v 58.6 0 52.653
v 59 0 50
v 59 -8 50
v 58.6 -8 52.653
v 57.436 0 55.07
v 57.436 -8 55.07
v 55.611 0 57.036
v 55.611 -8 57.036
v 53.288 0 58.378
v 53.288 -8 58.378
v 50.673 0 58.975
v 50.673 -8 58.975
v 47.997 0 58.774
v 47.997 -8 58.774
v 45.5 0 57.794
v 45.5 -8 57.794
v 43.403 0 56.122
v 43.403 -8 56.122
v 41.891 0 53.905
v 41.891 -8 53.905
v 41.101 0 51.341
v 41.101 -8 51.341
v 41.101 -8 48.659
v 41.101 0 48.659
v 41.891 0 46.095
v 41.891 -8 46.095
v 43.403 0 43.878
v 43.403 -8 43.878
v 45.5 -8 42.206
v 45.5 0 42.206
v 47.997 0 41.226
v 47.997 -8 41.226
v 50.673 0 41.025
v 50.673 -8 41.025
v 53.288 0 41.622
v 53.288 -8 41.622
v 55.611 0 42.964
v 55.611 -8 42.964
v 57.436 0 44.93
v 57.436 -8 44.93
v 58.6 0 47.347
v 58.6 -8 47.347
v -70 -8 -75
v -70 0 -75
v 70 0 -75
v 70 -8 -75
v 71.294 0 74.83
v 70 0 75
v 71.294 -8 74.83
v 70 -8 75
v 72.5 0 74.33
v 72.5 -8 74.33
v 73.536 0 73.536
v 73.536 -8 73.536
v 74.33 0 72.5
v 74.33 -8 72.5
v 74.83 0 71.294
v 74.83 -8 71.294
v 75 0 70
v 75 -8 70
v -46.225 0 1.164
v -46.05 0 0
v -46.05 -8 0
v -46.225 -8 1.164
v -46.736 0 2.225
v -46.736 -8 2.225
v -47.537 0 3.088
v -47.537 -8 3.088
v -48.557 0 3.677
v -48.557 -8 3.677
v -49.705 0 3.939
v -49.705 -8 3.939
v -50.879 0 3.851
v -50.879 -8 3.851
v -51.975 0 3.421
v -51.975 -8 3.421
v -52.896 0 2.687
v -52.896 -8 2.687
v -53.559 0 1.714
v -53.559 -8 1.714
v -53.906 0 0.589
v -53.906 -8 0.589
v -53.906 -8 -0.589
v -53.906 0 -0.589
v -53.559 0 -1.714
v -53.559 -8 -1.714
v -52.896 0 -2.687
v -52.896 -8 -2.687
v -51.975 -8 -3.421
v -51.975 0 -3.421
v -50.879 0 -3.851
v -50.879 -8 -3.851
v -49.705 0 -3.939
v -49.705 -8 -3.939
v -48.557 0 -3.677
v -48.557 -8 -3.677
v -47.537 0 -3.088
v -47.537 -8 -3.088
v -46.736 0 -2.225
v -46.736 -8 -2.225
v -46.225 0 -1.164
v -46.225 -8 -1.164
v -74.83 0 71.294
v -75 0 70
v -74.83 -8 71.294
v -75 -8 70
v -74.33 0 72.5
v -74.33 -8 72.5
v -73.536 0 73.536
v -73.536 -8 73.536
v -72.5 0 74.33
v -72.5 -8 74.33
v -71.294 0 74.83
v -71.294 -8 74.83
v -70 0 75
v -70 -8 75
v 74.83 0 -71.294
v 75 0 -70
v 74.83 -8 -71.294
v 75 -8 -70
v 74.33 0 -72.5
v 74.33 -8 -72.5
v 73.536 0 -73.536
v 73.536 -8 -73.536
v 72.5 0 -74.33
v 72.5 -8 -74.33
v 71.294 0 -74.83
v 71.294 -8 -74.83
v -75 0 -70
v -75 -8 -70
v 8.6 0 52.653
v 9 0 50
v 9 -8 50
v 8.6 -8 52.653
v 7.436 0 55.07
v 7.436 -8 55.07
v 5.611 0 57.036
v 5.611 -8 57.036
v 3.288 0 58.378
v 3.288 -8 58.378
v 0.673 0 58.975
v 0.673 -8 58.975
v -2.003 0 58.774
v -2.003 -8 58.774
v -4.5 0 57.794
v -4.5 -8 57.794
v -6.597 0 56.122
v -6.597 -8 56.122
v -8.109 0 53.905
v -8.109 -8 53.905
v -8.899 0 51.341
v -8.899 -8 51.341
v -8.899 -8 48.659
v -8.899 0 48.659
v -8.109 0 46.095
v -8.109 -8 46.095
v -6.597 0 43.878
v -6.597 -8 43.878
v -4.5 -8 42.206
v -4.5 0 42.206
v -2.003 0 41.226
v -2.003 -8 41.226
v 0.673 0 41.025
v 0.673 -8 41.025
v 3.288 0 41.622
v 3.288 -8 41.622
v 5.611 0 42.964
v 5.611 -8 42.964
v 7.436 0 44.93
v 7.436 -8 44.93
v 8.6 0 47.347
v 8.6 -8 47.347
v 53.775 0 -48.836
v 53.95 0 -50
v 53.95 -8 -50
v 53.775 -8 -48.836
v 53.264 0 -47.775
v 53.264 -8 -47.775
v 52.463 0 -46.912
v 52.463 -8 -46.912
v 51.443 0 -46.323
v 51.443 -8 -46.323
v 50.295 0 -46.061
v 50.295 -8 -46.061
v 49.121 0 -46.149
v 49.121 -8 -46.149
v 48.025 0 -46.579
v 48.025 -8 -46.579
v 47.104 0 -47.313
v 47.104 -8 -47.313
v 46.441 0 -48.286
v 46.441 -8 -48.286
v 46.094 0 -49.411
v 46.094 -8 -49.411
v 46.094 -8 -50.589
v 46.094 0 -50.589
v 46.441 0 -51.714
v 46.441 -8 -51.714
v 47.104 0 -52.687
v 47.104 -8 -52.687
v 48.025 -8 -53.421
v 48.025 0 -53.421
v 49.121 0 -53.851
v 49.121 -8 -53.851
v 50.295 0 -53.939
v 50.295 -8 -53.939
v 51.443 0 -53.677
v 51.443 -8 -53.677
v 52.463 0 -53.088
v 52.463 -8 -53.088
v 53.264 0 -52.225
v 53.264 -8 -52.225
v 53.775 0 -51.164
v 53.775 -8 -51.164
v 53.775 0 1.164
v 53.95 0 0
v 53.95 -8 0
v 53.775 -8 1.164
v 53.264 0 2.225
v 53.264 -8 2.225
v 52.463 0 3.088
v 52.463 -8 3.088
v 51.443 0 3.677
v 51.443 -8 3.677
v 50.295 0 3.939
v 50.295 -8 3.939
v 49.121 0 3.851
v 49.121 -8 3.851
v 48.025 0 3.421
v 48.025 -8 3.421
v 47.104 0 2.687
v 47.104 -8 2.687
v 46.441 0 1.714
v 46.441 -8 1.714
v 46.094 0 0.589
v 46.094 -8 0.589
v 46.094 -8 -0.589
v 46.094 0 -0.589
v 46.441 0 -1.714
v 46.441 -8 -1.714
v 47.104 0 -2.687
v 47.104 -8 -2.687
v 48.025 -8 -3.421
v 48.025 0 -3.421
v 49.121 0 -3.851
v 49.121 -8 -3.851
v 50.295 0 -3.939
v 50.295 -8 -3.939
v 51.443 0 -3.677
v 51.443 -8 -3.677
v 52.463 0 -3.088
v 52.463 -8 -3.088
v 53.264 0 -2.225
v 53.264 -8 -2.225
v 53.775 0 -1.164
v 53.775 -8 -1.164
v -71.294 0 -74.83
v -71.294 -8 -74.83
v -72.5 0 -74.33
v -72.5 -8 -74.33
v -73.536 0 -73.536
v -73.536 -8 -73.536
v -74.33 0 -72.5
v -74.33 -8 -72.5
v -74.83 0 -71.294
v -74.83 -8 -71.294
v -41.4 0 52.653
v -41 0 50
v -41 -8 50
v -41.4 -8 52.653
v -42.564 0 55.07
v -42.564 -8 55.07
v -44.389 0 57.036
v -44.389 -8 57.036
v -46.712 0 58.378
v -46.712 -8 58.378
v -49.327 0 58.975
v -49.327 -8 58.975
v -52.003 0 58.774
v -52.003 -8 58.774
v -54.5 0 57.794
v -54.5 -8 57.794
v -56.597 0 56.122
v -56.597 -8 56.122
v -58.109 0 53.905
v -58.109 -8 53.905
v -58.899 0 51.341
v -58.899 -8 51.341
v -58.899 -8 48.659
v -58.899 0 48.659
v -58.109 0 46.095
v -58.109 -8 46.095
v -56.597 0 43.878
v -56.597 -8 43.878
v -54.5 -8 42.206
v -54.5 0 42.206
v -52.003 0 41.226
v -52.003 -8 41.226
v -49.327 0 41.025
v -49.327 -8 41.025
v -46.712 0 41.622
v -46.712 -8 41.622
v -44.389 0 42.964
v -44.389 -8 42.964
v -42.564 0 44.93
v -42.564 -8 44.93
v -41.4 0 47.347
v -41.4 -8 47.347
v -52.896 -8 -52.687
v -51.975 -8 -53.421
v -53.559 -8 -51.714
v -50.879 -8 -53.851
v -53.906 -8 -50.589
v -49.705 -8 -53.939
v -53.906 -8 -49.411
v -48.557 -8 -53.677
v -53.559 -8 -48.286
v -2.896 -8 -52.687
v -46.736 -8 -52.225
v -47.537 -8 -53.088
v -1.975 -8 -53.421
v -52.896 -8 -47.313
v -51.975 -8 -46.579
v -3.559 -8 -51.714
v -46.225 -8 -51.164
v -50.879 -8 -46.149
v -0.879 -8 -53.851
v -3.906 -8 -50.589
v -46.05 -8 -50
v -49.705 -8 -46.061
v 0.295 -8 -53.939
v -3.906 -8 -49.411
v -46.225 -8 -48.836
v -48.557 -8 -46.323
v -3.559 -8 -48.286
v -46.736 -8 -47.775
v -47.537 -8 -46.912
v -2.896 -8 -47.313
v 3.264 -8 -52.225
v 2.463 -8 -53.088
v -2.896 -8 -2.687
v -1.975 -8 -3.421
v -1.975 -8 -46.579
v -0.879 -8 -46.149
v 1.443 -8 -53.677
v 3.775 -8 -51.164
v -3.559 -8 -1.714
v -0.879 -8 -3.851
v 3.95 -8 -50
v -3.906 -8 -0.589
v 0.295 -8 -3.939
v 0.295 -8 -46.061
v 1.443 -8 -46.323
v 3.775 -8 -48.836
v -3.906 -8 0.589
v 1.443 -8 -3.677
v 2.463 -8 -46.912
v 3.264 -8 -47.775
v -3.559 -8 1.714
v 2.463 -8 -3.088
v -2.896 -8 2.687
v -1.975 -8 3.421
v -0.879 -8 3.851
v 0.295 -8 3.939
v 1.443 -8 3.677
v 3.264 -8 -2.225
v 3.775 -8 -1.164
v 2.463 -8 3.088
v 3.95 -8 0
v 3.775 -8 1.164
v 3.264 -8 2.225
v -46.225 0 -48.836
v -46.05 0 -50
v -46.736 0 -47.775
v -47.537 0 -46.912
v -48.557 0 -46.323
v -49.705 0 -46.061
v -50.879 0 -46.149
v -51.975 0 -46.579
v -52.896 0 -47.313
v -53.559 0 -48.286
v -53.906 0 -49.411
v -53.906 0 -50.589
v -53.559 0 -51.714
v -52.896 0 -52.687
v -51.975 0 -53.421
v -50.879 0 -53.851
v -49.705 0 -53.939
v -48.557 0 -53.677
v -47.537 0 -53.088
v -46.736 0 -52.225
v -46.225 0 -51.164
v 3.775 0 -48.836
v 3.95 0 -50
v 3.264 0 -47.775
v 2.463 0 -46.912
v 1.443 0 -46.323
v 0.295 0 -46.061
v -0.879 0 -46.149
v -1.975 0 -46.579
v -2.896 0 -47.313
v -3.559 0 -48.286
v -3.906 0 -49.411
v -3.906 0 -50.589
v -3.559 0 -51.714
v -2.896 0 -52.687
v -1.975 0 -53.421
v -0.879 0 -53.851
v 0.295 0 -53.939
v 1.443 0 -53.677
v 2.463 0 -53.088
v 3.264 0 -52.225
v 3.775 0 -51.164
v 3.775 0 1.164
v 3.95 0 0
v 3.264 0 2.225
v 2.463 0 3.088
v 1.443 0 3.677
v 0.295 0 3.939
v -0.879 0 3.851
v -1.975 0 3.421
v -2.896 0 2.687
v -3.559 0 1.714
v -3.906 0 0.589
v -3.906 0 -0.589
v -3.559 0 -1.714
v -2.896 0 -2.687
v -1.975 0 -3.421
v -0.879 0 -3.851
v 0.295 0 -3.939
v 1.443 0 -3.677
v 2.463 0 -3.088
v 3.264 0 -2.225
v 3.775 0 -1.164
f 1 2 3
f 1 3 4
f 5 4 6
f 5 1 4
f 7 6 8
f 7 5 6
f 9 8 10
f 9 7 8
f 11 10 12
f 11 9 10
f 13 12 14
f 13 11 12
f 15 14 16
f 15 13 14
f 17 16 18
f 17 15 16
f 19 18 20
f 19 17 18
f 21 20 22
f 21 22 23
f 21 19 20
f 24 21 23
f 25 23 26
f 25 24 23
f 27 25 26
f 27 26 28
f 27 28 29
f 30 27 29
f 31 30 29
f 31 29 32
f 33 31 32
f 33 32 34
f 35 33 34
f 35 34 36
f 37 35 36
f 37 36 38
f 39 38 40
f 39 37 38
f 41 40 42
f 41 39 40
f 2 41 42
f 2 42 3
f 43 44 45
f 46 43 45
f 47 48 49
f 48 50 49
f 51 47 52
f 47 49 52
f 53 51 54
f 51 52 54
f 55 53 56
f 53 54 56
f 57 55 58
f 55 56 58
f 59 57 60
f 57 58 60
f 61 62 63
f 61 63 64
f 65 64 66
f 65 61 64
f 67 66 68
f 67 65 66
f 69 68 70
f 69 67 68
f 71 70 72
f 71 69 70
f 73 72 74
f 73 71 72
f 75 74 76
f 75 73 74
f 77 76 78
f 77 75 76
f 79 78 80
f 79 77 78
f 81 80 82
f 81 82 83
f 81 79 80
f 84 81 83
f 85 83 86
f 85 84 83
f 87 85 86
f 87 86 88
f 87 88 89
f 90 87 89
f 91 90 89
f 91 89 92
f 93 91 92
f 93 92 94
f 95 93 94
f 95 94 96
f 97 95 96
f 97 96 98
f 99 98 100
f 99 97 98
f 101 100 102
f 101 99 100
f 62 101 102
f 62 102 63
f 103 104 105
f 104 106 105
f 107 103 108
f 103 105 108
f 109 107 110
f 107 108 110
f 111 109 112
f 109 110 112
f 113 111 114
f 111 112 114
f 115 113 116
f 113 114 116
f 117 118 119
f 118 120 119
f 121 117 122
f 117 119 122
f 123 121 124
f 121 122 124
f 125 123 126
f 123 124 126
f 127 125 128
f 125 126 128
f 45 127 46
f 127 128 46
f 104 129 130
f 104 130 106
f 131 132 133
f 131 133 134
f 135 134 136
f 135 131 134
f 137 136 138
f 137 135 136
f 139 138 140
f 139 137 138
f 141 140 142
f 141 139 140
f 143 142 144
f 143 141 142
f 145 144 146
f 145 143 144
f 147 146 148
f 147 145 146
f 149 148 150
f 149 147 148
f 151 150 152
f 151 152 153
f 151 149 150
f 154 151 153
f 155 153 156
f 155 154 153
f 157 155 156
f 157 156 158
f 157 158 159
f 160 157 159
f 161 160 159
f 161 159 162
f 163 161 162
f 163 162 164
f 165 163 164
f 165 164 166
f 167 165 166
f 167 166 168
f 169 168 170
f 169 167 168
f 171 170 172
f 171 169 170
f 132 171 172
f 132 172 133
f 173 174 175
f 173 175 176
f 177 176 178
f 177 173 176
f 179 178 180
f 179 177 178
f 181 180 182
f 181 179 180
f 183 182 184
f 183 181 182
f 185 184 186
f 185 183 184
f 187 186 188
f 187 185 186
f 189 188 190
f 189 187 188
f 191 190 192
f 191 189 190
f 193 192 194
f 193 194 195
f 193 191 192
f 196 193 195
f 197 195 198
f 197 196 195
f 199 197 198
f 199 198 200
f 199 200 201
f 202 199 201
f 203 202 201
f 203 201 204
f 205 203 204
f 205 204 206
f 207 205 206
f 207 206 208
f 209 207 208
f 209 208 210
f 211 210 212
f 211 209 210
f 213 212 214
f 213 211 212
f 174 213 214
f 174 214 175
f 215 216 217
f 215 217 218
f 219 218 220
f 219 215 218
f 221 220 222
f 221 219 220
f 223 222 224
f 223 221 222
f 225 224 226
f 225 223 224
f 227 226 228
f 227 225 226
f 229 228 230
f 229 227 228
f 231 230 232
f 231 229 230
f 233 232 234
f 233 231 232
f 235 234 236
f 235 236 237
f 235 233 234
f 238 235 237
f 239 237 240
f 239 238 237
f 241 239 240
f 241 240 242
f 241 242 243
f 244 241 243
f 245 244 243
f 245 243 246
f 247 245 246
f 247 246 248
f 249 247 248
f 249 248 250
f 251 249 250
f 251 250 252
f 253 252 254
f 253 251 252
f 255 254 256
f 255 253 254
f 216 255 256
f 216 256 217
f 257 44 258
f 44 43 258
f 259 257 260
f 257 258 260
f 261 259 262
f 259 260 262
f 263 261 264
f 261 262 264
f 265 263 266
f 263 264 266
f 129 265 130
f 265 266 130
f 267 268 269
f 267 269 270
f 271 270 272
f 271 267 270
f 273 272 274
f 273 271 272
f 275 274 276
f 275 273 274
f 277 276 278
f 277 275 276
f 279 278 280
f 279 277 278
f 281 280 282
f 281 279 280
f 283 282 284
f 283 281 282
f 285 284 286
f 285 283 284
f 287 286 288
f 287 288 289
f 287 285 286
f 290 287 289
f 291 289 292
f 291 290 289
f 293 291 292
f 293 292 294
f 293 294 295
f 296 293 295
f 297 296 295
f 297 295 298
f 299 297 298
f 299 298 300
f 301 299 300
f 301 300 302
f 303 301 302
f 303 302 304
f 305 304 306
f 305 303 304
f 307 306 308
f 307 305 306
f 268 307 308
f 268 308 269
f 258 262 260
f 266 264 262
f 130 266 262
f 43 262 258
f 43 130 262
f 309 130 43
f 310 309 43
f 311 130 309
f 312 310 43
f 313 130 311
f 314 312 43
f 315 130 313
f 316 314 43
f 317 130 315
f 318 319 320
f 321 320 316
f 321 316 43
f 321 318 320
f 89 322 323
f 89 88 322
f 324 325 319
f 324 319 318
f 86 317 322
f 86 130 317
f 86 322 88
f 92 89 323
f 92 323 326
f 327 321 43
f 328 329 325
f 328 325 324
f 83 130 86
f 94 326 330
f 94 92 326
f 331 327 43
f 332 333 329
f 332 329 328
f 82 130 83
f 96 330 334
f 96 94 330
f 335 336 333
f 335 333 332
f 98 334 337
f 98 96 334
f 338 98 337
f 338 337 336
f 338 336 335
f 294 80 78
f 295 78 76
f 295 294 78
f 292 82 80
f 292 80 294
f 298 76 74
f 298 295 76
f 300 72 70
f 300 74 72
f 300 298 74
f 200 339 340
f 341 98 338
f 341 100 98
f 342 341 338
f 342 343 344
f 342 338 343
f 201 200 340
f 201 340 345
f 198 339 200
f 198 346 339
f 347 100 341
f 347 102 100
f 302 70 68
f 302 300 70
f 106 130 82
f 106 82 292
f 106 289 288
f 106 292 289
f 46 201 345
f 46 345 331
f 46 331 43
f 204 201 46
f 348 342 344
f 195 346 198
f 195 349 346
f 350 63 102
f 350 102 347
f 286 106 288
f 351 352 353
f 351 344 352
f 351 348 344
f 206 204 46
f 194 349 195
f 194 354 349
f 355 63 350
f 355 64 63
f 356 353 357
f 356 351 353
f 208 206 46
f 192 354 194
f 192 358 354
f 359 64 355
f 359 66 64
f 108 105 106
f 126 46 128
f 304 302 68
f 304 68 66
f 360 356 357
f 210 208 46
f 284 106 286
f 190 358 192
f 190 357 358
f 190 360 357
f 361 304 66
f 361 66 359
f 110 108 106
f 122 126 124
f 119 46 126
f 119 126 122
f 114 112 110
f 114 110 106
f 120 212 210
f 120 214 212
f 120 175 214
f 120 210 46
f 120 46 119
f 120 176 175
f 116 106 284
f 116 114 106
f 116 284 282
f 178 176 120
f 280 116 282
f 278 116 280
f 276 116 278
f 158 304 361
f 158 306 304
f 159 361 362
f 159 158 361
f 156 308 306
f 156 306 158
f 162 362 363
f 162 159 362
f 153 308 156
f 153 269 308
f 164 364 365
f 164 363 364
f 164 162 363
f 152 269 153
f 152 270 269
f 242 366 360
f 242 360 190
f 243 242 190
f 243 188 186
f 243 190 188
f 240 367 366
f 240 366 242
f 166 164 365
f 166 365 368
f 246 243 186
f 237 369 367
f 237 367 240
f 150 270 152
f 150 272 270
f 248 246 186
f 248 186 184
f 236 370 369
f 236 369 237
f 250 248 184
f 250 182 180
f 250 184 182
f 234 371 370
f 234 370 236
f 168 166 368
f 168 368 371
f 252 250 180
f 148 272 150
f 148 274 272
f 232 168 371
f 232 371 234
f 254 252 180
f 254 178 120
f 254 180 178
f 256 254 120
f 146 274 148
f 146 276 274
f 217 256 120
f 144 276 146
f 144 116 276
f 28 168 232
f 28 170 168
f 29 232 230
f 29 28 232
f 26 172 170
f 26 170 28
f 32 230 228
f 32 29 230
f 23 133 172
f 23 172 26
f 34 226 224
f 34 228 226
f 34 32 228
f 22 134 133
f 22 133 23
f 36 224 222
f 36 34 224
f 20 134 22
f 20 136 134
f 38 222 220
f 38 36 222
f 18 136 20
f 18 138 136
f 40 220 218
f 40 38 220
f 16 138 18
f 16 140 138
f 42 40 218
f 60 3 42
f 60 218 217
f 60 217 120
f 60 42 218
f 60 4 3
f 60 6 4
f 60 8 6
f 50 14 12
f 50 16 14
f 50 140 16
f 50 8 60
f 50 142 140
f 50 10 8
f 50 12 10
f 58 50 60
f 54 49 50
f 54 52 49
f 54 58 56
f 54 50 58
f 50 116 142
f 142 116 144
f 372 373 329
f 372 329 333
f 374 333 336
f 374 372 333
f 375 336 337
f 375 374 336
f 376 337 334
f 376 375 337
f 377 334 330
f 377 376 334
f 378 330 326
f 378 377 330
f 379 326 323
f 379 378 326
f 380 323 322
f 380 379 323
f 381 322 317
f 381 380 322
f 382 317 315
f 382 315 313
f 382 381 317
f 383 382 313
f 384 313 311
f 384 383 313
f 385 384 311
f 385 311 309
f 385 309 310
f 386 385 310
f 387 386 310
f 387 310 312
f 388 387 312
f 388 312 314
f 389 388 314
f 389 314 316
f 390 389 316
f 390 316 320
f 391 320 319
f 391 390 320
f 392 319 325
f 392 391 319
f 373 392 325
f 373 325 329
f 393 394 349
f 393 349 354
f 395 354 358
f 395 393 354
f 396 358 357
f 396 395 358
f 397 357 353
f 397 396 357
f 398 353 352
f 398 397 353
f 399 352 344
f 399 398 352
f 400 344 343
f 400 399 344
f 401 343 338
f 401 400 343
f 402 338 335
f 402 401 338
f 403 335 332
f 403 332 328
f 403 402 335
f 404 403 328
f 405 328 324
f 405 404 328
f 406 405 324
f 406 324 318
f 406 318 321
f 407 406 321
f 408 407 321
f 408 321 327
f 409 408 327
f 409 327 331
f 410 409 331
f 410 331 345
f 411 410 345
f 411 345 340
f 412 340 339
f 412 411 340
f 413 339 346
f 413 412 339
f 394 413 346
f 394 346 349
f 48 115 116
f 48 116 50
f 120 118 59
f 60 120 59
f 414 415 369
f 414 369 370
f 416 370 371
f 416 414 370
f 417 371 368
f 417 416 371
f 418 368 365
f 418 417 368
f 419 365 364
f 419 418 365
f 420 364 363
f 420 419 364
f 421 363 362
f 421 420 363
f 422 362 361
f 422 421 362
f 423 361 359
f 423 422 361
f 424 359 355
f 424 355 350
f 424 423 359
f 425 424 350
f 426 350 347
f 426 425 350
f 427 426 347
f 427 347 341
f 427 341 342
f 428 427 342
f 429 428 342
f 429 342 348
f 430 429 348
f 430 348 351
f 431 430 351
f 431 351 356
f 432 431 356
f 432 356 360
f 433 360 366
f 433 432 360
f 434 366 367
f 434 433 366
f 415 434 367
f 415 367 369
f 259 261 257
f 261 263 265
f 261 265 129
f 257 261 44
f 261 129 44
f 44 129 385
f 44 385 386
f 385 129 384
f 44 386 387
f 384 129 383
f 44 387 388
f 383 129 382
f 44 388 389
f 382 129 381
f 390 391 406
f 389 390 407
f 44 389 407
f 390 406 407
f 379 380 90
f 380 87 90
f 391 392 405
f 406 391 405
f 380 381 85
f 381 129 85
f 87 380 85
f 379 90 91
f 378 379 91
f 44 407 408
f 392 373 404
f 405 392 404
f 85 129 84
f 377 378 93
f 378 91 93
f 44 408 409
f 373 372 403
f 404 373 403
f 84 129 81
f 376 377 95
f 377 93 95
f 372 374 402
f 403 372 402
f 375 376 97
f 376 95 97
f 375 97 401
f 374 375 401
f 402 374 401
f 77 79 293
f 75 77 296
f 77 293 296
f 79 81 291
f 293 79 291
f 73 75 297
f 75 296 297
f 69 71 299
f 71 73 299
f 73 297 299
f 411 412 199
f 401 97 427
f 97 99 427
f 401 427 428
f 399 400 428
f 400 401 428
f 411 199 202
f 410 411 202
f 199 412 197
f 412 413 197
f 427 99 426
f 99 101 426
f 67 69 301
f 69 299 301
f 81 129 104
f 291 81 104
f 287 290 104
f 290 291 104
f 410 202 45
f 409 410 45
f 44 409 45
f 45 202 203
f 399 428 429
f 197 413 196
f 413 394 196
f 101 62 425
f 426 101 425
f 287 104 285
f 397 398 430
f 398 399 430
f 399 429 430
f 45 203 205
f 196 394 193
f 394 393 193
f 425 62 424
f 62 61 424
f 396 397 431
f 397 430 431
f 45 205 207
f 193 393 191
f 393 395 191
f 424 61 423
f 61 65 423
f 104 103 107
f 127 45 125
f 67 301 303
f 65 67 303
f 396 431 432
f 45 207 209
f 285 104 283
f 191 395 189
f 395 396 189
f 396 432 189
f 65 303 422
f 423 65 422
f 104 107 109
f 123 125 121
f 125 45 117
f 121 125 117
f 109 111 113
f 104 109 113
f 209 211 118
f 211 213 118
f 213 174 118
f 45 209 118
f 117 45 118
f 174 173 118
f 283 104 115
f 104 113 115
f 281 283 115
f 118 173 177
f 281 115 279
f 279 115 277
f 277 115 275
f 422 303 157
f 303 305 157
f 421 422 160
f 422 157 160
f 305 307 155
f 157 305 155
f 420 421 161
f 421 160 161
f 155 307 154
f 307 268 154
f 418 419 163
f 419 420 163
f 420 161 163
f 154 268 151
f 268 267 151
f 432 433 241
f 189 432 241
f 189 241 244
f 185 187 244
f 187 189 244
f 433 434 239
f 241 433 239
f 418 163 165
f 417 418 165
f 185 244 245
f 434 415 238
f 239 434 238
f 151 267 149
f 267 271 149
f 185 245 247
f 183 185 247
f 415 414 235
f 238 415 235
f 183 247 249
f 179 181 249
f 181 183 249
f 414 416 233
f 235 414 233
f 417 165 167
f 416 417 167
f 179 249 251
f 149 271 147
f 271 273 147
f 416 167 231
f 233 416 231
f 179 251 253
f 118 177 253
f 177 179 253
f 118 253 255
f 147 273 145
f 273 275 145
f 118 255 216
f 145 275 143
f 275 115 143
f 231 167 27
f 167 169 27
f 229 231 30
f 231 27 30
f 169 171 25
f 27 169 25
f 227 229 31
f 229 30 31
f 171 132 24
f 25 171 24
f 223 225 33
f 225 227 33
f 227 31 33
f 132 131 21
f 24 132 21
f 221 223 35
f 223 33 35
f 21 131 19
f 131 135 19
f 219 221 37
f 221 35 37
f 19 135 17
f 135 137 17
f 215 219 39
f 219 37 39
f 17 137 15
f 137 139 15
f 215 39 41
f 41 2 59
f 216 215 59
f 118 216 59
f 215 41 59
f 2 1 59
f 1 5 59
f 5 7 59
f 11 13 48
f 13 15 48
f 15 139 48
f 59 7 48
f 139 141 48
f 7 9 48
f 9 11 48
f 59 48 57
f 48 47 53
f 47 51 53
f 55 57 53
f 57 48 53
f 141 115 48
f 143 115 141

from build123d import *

# Parameters (mm, degrees)
F0_W     = 150
F0_H     = 150
F0_R     = 3.95
F0_R_2   = 9
F1_DEPTH = 8
F2_R     = 5
F3_R     = 5
F4_R     = 5
F5_R     = 5


with BuildPart() as f1:
    # F0 (on Front) → F1 (new body)
    with BuildSketch(Plane.XZ):
        Rectangle(F0_W, F0_H)
        with Locations((-50, -50)):
            Circle(F0_R, mode=Mode.SUBTRACT)
        with Locations((0, -50)):
            Circle(F0_R, mode=Mode.SUBTRACT)
        with Locations((50, -50)):
            Circle(F0_R, mode=Mode.SUBTRACT)
        with Locations((-50, 0)):
            Circle(F0_R, mode=Mode.SUBTRACT)
        with Locations((-50, 50)):
            Circle(F0_R_2, mode=Mode.SUBTRACT)
        Circle(F0_R, mode=Mode.SUBTRACT)
        with Locations((50, 0)):
            Circle(F0_R, mode=Mode.SUBTRACT)
        with Locations((0, 50)):
            Circle(F0_R_2, mode=Mode.SUBTRACT)
        with Locations((50, 50)):
            Circle(F0_R_2, mode=Mode.SUBTRACT)
    extrude(amount=F1_DEPTH)

    # F2
    f2_edges = [f1.edges().sort_by_distance(p)[0] for p in [
        (75, -4, 75),
    ]]
    fillet(f2_edges, radius=F2_R)

    # F3
    f3_edges = [f1.edges().sort_by_distance(p)[0] for p in [
        (75, -4, -75),
    ]]
    fillet(f3_edges, radius=F3_R)

    # F4
    f4_edges = [f1.edges().sort_by_distance(p)[0] for p in [
        (-75, -4, -75),
    ]]
    fillet(f4_edges, radius=F4_R)

    # F5
    f5_edges = [f1.edges().sort_by_distance(p)[0] for p in [
        (-75, -4, 75),
    ]]
    fillet(f5_edges, radius=F5_R)


solid = f1.part
